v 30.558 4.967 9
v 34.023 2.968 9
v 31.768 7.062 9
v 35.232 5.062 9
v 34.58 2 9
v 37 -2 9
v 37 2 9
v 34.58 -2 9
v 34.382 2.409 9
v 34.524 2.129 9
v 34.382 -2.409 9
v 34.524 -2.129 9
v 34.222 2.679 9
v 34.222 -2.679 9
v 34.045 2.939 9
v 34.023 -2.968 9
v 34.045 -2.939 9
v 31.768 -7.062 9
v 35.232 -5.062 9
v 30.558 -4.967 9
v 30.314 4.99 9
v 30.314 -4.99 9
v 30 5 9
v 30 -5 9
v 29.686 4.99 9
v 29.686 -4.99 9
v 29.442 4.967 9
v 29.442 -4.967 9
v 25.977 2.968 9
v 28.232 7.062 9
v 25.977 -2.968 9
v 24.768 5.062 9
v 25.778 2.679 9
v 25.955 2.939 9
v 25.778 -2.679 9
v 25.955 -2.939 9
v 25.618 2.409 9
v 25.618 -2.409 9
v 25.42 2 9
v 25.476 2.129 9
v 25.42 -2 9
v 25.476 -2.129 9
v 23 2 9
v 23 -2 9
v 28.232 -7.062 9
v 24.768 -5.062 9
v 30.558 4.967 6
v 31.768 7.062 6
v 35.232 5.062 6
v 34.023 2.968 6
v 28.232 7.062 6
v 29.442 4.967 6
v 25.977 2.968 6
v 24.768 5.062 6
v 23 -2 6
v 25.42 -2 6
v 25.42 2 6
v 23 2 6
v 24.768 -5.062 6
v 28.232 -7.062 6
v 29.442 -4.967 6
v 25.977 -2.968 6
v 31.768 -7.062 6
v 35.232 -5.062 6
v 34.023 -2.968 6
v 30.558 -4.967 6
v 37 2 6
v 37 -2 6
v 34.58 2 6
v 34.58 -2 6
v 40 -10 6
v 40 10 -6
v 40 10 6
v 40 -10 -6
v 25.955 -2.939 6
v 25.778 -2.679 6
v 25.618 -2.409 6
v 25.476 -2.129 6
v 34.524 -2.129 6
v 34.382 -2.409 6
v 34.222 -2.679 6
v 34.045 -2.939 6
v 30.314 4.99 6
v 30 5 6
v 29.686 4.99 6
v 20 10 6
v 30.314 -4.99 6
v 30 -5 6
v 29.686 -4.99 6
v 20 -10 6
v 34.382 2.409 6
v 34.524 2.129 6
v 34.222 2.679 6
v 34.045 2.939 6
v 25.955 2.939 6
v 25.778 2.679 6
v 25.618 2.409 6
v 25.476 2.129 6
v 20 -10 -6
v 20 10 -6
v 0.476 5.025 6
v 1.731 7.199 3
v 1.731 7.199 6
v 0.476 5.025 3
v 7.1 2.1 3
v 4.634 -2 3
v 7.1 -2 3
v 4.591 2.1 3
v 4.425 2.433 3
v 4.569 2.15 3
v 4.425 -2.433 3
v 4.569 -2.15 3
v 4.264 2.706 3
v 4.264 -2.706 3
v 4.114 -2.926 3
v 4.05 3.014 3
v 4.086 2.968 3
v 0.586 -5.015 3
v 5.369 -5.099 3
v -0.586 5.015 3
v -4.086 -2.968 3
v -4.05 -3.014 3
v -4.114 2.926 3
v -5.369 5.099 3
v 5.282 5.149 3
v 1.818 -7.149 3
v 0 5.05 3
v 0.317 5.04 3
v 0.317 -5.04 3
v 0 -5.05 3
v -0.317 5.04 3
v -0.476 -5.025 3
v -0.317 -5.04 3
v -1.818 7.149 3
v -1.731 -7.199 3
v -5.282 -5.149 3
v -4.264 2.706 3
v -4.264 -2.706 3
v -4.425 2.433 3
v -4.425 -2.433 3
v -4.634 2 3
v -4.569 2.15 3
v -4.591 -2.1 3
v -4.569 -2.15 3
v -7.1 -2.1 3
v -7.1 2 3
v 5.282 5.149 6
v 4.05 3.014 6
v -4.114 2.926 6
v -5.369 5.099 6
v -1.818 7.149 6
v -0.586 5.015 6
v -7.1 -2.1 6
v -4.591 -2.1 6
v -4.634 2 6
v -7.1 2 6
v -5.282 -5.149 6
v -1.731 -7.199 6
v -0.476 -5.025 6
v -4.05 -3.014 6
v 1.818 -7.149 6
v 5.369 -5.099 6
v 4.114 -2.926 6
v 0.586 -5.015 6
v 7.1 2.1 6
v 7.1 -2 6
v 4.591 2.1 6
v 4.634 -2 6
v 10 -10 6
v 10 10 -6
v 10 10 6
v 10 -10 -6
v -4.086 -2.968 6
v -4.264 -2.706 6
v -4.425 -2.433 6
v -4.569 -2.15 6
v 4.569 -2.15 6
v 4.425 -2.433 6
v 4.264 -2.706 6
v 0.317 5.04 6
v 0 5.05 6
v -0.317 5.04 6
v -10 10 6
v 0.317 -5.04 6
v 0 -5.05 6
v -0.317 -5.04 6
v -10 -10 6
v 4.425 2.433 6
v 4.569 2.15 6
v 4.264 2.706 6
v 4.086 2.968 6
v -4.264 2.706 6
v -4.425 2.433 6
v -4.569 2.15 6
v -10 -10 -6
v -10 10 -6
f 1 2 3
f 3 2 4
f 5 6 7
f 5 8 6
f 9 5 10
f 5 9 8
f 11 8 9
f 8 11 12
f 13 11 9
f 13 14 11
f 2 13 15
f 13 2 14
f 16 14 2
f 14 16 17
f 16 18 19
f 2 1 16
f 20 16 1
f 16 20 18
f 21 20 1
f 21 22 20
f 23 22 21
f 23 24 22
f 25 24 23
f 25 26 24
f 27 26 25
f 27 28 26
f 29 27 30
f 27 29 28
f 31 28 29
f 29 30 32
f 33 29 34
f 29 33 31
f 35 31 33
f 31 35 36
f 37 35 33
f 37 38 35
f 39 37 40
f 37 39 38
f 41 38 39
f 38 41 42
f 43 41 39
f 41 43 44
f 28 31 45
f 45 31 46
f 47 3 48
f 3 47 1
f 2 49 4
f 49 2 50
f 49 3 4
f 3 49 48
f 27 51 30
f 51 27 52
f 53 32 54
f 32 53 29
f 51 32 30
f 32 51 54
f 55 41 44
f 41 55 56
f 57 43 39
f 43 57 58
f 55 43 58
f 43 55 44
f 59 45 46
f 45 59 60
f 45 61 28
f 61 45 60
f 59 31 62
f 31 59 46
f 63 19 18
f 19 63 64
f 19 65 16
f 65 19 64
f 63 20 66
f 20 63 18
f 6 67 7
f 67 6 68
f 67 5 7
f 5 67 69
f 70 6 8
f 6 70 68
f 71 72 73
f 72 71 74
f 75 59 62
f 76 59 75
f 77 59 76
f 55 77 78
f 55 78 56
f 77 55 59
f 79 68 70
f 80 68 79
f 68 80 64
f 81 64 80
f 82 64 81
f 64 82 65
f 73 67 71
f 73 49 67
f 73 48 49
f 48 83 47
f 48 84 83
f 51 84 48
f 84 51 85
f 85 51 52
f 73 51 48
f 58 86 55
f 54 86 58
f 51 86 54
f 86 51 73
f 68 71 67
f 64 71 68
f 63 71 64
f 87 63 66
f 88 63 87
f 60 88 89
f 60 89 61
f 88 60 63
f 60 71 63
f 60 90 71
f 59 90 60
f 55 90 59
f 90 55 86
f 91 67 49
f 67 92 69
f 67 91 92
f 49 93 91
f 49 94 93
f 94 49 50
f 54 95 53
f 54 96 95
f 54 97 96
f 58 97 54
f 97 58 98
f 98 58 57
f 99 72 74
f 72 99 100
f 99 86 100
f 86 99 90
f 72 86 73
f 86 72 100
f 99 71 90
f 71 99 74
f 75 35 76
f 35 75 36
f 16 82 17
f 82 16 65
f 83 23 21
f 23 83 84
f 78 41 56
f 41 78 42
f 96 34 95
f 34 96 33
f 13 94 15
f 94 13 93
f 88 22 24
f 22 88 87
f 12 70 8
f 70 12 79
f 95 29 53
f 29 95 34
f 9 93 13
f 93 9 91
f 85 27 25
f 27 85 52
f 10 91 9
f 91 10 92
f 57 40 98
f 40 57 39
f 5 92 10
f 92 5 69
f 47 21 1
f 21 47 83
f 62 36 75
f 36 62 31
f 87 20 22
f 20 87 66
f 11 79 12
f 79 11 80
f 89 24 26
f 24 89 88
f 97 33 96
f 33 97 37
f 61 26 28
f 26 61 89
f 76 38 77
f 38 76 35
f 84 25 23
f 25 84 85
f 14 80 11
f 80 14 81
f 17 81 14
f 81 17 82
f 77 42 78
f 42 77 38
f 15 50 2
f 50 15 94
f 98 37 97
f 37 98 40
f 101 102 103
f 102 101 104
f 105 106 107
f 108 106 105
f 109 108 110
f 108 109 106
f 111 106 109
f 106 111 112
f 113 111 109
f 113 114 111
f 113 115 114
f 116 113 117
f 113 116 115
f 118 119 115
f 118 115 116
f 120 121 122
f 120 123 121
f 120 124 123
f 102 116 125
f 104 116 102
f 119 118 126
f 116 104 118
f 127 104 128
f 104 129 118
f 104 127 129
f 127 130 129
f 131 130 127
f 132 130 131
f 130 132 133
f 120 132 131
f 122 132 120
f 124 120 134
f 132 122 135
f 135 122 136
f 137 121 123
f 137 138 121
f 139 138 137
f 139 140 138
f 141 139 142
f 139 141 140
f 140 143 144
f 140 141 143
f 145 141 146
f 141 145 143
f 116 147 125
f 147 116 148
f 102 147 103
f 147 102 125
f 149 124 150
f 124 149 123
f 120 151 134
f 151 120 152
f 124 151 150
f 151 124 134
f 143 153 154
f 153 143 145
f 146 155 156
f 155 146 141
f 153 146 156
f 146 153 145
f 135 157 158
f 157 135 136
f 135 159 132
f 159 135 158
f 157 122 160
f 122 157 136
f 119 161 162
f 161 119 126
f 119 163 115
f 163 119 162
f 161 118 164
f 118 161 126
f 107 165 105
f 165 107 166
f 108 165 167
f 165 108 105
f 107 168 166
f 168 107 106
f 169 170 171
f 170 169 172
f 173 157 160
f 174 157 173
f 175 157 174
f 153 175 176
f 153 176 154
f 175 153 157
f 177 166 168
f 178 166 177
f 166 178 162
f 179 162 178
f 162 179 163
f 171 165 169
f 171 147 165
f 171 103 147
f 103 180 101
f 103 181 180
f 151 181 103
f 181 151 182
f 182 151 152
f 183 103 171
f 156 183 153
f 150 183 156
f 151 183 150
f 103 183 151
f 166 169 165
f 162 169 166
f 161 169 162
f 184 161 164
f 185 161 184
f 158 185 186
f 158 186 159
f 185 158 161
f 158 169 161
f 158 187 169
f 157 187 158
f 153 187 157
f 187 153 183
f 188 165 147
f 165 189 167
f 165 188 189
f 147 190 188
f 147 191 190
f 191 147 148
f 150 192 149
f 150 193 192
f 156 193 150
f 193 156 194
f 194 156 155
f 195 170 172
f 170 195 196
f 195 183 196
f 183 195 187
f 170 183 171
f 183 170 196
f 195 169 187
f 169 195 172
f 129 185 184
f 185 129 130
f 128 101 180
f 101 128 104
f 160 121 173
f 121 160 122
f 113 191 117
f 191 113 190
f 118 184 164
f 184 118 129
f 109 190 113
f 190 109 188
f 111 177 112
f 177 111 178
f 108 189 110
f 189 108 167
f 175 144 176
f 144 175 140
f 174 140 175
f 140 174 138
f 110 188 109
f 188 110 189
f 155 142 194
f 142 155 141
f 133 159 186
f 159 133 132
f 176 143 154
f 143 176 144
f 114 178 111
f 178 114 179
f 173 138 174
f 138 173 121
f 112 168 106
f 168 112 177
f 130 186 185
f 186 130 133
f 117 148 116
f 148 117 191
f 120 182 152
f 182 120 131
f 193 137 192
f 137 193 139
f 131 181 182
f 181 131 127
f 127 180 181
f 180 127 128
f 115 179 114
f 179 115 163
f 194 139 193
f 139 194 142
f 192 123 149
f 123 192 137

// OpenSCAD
$fn = 100;
error = 0.1;
x = 20;
y = 20; 
h = 6;
n = 6;


color("cyan")
translate([30, 0,0])    
union() {
    cube([x,y,h * 2], center = true);
    
    translate([0, 0 , h])
    cylinder(d = y/2 , h = h, center = true);
    
    for (i=[1:n]) {
        rotate([0, 0, i*360/n])
        translate([x/4-2, -2 , h/ 2])
        cube([4, 4, h]);
        }    
}
difference() {
    cube([x,y,h * 2], center = true);
    
    translate([0, 0 , h])
    cylinder(d = y/2 + error, h = h, center = true);
    
    for (i=[1:n]) {
        rotate([0, 0, i*360/n])
        translate([x/4-2, -2 , h/2])
        cube([4 + error, 4 + error, h]);
        }
}
